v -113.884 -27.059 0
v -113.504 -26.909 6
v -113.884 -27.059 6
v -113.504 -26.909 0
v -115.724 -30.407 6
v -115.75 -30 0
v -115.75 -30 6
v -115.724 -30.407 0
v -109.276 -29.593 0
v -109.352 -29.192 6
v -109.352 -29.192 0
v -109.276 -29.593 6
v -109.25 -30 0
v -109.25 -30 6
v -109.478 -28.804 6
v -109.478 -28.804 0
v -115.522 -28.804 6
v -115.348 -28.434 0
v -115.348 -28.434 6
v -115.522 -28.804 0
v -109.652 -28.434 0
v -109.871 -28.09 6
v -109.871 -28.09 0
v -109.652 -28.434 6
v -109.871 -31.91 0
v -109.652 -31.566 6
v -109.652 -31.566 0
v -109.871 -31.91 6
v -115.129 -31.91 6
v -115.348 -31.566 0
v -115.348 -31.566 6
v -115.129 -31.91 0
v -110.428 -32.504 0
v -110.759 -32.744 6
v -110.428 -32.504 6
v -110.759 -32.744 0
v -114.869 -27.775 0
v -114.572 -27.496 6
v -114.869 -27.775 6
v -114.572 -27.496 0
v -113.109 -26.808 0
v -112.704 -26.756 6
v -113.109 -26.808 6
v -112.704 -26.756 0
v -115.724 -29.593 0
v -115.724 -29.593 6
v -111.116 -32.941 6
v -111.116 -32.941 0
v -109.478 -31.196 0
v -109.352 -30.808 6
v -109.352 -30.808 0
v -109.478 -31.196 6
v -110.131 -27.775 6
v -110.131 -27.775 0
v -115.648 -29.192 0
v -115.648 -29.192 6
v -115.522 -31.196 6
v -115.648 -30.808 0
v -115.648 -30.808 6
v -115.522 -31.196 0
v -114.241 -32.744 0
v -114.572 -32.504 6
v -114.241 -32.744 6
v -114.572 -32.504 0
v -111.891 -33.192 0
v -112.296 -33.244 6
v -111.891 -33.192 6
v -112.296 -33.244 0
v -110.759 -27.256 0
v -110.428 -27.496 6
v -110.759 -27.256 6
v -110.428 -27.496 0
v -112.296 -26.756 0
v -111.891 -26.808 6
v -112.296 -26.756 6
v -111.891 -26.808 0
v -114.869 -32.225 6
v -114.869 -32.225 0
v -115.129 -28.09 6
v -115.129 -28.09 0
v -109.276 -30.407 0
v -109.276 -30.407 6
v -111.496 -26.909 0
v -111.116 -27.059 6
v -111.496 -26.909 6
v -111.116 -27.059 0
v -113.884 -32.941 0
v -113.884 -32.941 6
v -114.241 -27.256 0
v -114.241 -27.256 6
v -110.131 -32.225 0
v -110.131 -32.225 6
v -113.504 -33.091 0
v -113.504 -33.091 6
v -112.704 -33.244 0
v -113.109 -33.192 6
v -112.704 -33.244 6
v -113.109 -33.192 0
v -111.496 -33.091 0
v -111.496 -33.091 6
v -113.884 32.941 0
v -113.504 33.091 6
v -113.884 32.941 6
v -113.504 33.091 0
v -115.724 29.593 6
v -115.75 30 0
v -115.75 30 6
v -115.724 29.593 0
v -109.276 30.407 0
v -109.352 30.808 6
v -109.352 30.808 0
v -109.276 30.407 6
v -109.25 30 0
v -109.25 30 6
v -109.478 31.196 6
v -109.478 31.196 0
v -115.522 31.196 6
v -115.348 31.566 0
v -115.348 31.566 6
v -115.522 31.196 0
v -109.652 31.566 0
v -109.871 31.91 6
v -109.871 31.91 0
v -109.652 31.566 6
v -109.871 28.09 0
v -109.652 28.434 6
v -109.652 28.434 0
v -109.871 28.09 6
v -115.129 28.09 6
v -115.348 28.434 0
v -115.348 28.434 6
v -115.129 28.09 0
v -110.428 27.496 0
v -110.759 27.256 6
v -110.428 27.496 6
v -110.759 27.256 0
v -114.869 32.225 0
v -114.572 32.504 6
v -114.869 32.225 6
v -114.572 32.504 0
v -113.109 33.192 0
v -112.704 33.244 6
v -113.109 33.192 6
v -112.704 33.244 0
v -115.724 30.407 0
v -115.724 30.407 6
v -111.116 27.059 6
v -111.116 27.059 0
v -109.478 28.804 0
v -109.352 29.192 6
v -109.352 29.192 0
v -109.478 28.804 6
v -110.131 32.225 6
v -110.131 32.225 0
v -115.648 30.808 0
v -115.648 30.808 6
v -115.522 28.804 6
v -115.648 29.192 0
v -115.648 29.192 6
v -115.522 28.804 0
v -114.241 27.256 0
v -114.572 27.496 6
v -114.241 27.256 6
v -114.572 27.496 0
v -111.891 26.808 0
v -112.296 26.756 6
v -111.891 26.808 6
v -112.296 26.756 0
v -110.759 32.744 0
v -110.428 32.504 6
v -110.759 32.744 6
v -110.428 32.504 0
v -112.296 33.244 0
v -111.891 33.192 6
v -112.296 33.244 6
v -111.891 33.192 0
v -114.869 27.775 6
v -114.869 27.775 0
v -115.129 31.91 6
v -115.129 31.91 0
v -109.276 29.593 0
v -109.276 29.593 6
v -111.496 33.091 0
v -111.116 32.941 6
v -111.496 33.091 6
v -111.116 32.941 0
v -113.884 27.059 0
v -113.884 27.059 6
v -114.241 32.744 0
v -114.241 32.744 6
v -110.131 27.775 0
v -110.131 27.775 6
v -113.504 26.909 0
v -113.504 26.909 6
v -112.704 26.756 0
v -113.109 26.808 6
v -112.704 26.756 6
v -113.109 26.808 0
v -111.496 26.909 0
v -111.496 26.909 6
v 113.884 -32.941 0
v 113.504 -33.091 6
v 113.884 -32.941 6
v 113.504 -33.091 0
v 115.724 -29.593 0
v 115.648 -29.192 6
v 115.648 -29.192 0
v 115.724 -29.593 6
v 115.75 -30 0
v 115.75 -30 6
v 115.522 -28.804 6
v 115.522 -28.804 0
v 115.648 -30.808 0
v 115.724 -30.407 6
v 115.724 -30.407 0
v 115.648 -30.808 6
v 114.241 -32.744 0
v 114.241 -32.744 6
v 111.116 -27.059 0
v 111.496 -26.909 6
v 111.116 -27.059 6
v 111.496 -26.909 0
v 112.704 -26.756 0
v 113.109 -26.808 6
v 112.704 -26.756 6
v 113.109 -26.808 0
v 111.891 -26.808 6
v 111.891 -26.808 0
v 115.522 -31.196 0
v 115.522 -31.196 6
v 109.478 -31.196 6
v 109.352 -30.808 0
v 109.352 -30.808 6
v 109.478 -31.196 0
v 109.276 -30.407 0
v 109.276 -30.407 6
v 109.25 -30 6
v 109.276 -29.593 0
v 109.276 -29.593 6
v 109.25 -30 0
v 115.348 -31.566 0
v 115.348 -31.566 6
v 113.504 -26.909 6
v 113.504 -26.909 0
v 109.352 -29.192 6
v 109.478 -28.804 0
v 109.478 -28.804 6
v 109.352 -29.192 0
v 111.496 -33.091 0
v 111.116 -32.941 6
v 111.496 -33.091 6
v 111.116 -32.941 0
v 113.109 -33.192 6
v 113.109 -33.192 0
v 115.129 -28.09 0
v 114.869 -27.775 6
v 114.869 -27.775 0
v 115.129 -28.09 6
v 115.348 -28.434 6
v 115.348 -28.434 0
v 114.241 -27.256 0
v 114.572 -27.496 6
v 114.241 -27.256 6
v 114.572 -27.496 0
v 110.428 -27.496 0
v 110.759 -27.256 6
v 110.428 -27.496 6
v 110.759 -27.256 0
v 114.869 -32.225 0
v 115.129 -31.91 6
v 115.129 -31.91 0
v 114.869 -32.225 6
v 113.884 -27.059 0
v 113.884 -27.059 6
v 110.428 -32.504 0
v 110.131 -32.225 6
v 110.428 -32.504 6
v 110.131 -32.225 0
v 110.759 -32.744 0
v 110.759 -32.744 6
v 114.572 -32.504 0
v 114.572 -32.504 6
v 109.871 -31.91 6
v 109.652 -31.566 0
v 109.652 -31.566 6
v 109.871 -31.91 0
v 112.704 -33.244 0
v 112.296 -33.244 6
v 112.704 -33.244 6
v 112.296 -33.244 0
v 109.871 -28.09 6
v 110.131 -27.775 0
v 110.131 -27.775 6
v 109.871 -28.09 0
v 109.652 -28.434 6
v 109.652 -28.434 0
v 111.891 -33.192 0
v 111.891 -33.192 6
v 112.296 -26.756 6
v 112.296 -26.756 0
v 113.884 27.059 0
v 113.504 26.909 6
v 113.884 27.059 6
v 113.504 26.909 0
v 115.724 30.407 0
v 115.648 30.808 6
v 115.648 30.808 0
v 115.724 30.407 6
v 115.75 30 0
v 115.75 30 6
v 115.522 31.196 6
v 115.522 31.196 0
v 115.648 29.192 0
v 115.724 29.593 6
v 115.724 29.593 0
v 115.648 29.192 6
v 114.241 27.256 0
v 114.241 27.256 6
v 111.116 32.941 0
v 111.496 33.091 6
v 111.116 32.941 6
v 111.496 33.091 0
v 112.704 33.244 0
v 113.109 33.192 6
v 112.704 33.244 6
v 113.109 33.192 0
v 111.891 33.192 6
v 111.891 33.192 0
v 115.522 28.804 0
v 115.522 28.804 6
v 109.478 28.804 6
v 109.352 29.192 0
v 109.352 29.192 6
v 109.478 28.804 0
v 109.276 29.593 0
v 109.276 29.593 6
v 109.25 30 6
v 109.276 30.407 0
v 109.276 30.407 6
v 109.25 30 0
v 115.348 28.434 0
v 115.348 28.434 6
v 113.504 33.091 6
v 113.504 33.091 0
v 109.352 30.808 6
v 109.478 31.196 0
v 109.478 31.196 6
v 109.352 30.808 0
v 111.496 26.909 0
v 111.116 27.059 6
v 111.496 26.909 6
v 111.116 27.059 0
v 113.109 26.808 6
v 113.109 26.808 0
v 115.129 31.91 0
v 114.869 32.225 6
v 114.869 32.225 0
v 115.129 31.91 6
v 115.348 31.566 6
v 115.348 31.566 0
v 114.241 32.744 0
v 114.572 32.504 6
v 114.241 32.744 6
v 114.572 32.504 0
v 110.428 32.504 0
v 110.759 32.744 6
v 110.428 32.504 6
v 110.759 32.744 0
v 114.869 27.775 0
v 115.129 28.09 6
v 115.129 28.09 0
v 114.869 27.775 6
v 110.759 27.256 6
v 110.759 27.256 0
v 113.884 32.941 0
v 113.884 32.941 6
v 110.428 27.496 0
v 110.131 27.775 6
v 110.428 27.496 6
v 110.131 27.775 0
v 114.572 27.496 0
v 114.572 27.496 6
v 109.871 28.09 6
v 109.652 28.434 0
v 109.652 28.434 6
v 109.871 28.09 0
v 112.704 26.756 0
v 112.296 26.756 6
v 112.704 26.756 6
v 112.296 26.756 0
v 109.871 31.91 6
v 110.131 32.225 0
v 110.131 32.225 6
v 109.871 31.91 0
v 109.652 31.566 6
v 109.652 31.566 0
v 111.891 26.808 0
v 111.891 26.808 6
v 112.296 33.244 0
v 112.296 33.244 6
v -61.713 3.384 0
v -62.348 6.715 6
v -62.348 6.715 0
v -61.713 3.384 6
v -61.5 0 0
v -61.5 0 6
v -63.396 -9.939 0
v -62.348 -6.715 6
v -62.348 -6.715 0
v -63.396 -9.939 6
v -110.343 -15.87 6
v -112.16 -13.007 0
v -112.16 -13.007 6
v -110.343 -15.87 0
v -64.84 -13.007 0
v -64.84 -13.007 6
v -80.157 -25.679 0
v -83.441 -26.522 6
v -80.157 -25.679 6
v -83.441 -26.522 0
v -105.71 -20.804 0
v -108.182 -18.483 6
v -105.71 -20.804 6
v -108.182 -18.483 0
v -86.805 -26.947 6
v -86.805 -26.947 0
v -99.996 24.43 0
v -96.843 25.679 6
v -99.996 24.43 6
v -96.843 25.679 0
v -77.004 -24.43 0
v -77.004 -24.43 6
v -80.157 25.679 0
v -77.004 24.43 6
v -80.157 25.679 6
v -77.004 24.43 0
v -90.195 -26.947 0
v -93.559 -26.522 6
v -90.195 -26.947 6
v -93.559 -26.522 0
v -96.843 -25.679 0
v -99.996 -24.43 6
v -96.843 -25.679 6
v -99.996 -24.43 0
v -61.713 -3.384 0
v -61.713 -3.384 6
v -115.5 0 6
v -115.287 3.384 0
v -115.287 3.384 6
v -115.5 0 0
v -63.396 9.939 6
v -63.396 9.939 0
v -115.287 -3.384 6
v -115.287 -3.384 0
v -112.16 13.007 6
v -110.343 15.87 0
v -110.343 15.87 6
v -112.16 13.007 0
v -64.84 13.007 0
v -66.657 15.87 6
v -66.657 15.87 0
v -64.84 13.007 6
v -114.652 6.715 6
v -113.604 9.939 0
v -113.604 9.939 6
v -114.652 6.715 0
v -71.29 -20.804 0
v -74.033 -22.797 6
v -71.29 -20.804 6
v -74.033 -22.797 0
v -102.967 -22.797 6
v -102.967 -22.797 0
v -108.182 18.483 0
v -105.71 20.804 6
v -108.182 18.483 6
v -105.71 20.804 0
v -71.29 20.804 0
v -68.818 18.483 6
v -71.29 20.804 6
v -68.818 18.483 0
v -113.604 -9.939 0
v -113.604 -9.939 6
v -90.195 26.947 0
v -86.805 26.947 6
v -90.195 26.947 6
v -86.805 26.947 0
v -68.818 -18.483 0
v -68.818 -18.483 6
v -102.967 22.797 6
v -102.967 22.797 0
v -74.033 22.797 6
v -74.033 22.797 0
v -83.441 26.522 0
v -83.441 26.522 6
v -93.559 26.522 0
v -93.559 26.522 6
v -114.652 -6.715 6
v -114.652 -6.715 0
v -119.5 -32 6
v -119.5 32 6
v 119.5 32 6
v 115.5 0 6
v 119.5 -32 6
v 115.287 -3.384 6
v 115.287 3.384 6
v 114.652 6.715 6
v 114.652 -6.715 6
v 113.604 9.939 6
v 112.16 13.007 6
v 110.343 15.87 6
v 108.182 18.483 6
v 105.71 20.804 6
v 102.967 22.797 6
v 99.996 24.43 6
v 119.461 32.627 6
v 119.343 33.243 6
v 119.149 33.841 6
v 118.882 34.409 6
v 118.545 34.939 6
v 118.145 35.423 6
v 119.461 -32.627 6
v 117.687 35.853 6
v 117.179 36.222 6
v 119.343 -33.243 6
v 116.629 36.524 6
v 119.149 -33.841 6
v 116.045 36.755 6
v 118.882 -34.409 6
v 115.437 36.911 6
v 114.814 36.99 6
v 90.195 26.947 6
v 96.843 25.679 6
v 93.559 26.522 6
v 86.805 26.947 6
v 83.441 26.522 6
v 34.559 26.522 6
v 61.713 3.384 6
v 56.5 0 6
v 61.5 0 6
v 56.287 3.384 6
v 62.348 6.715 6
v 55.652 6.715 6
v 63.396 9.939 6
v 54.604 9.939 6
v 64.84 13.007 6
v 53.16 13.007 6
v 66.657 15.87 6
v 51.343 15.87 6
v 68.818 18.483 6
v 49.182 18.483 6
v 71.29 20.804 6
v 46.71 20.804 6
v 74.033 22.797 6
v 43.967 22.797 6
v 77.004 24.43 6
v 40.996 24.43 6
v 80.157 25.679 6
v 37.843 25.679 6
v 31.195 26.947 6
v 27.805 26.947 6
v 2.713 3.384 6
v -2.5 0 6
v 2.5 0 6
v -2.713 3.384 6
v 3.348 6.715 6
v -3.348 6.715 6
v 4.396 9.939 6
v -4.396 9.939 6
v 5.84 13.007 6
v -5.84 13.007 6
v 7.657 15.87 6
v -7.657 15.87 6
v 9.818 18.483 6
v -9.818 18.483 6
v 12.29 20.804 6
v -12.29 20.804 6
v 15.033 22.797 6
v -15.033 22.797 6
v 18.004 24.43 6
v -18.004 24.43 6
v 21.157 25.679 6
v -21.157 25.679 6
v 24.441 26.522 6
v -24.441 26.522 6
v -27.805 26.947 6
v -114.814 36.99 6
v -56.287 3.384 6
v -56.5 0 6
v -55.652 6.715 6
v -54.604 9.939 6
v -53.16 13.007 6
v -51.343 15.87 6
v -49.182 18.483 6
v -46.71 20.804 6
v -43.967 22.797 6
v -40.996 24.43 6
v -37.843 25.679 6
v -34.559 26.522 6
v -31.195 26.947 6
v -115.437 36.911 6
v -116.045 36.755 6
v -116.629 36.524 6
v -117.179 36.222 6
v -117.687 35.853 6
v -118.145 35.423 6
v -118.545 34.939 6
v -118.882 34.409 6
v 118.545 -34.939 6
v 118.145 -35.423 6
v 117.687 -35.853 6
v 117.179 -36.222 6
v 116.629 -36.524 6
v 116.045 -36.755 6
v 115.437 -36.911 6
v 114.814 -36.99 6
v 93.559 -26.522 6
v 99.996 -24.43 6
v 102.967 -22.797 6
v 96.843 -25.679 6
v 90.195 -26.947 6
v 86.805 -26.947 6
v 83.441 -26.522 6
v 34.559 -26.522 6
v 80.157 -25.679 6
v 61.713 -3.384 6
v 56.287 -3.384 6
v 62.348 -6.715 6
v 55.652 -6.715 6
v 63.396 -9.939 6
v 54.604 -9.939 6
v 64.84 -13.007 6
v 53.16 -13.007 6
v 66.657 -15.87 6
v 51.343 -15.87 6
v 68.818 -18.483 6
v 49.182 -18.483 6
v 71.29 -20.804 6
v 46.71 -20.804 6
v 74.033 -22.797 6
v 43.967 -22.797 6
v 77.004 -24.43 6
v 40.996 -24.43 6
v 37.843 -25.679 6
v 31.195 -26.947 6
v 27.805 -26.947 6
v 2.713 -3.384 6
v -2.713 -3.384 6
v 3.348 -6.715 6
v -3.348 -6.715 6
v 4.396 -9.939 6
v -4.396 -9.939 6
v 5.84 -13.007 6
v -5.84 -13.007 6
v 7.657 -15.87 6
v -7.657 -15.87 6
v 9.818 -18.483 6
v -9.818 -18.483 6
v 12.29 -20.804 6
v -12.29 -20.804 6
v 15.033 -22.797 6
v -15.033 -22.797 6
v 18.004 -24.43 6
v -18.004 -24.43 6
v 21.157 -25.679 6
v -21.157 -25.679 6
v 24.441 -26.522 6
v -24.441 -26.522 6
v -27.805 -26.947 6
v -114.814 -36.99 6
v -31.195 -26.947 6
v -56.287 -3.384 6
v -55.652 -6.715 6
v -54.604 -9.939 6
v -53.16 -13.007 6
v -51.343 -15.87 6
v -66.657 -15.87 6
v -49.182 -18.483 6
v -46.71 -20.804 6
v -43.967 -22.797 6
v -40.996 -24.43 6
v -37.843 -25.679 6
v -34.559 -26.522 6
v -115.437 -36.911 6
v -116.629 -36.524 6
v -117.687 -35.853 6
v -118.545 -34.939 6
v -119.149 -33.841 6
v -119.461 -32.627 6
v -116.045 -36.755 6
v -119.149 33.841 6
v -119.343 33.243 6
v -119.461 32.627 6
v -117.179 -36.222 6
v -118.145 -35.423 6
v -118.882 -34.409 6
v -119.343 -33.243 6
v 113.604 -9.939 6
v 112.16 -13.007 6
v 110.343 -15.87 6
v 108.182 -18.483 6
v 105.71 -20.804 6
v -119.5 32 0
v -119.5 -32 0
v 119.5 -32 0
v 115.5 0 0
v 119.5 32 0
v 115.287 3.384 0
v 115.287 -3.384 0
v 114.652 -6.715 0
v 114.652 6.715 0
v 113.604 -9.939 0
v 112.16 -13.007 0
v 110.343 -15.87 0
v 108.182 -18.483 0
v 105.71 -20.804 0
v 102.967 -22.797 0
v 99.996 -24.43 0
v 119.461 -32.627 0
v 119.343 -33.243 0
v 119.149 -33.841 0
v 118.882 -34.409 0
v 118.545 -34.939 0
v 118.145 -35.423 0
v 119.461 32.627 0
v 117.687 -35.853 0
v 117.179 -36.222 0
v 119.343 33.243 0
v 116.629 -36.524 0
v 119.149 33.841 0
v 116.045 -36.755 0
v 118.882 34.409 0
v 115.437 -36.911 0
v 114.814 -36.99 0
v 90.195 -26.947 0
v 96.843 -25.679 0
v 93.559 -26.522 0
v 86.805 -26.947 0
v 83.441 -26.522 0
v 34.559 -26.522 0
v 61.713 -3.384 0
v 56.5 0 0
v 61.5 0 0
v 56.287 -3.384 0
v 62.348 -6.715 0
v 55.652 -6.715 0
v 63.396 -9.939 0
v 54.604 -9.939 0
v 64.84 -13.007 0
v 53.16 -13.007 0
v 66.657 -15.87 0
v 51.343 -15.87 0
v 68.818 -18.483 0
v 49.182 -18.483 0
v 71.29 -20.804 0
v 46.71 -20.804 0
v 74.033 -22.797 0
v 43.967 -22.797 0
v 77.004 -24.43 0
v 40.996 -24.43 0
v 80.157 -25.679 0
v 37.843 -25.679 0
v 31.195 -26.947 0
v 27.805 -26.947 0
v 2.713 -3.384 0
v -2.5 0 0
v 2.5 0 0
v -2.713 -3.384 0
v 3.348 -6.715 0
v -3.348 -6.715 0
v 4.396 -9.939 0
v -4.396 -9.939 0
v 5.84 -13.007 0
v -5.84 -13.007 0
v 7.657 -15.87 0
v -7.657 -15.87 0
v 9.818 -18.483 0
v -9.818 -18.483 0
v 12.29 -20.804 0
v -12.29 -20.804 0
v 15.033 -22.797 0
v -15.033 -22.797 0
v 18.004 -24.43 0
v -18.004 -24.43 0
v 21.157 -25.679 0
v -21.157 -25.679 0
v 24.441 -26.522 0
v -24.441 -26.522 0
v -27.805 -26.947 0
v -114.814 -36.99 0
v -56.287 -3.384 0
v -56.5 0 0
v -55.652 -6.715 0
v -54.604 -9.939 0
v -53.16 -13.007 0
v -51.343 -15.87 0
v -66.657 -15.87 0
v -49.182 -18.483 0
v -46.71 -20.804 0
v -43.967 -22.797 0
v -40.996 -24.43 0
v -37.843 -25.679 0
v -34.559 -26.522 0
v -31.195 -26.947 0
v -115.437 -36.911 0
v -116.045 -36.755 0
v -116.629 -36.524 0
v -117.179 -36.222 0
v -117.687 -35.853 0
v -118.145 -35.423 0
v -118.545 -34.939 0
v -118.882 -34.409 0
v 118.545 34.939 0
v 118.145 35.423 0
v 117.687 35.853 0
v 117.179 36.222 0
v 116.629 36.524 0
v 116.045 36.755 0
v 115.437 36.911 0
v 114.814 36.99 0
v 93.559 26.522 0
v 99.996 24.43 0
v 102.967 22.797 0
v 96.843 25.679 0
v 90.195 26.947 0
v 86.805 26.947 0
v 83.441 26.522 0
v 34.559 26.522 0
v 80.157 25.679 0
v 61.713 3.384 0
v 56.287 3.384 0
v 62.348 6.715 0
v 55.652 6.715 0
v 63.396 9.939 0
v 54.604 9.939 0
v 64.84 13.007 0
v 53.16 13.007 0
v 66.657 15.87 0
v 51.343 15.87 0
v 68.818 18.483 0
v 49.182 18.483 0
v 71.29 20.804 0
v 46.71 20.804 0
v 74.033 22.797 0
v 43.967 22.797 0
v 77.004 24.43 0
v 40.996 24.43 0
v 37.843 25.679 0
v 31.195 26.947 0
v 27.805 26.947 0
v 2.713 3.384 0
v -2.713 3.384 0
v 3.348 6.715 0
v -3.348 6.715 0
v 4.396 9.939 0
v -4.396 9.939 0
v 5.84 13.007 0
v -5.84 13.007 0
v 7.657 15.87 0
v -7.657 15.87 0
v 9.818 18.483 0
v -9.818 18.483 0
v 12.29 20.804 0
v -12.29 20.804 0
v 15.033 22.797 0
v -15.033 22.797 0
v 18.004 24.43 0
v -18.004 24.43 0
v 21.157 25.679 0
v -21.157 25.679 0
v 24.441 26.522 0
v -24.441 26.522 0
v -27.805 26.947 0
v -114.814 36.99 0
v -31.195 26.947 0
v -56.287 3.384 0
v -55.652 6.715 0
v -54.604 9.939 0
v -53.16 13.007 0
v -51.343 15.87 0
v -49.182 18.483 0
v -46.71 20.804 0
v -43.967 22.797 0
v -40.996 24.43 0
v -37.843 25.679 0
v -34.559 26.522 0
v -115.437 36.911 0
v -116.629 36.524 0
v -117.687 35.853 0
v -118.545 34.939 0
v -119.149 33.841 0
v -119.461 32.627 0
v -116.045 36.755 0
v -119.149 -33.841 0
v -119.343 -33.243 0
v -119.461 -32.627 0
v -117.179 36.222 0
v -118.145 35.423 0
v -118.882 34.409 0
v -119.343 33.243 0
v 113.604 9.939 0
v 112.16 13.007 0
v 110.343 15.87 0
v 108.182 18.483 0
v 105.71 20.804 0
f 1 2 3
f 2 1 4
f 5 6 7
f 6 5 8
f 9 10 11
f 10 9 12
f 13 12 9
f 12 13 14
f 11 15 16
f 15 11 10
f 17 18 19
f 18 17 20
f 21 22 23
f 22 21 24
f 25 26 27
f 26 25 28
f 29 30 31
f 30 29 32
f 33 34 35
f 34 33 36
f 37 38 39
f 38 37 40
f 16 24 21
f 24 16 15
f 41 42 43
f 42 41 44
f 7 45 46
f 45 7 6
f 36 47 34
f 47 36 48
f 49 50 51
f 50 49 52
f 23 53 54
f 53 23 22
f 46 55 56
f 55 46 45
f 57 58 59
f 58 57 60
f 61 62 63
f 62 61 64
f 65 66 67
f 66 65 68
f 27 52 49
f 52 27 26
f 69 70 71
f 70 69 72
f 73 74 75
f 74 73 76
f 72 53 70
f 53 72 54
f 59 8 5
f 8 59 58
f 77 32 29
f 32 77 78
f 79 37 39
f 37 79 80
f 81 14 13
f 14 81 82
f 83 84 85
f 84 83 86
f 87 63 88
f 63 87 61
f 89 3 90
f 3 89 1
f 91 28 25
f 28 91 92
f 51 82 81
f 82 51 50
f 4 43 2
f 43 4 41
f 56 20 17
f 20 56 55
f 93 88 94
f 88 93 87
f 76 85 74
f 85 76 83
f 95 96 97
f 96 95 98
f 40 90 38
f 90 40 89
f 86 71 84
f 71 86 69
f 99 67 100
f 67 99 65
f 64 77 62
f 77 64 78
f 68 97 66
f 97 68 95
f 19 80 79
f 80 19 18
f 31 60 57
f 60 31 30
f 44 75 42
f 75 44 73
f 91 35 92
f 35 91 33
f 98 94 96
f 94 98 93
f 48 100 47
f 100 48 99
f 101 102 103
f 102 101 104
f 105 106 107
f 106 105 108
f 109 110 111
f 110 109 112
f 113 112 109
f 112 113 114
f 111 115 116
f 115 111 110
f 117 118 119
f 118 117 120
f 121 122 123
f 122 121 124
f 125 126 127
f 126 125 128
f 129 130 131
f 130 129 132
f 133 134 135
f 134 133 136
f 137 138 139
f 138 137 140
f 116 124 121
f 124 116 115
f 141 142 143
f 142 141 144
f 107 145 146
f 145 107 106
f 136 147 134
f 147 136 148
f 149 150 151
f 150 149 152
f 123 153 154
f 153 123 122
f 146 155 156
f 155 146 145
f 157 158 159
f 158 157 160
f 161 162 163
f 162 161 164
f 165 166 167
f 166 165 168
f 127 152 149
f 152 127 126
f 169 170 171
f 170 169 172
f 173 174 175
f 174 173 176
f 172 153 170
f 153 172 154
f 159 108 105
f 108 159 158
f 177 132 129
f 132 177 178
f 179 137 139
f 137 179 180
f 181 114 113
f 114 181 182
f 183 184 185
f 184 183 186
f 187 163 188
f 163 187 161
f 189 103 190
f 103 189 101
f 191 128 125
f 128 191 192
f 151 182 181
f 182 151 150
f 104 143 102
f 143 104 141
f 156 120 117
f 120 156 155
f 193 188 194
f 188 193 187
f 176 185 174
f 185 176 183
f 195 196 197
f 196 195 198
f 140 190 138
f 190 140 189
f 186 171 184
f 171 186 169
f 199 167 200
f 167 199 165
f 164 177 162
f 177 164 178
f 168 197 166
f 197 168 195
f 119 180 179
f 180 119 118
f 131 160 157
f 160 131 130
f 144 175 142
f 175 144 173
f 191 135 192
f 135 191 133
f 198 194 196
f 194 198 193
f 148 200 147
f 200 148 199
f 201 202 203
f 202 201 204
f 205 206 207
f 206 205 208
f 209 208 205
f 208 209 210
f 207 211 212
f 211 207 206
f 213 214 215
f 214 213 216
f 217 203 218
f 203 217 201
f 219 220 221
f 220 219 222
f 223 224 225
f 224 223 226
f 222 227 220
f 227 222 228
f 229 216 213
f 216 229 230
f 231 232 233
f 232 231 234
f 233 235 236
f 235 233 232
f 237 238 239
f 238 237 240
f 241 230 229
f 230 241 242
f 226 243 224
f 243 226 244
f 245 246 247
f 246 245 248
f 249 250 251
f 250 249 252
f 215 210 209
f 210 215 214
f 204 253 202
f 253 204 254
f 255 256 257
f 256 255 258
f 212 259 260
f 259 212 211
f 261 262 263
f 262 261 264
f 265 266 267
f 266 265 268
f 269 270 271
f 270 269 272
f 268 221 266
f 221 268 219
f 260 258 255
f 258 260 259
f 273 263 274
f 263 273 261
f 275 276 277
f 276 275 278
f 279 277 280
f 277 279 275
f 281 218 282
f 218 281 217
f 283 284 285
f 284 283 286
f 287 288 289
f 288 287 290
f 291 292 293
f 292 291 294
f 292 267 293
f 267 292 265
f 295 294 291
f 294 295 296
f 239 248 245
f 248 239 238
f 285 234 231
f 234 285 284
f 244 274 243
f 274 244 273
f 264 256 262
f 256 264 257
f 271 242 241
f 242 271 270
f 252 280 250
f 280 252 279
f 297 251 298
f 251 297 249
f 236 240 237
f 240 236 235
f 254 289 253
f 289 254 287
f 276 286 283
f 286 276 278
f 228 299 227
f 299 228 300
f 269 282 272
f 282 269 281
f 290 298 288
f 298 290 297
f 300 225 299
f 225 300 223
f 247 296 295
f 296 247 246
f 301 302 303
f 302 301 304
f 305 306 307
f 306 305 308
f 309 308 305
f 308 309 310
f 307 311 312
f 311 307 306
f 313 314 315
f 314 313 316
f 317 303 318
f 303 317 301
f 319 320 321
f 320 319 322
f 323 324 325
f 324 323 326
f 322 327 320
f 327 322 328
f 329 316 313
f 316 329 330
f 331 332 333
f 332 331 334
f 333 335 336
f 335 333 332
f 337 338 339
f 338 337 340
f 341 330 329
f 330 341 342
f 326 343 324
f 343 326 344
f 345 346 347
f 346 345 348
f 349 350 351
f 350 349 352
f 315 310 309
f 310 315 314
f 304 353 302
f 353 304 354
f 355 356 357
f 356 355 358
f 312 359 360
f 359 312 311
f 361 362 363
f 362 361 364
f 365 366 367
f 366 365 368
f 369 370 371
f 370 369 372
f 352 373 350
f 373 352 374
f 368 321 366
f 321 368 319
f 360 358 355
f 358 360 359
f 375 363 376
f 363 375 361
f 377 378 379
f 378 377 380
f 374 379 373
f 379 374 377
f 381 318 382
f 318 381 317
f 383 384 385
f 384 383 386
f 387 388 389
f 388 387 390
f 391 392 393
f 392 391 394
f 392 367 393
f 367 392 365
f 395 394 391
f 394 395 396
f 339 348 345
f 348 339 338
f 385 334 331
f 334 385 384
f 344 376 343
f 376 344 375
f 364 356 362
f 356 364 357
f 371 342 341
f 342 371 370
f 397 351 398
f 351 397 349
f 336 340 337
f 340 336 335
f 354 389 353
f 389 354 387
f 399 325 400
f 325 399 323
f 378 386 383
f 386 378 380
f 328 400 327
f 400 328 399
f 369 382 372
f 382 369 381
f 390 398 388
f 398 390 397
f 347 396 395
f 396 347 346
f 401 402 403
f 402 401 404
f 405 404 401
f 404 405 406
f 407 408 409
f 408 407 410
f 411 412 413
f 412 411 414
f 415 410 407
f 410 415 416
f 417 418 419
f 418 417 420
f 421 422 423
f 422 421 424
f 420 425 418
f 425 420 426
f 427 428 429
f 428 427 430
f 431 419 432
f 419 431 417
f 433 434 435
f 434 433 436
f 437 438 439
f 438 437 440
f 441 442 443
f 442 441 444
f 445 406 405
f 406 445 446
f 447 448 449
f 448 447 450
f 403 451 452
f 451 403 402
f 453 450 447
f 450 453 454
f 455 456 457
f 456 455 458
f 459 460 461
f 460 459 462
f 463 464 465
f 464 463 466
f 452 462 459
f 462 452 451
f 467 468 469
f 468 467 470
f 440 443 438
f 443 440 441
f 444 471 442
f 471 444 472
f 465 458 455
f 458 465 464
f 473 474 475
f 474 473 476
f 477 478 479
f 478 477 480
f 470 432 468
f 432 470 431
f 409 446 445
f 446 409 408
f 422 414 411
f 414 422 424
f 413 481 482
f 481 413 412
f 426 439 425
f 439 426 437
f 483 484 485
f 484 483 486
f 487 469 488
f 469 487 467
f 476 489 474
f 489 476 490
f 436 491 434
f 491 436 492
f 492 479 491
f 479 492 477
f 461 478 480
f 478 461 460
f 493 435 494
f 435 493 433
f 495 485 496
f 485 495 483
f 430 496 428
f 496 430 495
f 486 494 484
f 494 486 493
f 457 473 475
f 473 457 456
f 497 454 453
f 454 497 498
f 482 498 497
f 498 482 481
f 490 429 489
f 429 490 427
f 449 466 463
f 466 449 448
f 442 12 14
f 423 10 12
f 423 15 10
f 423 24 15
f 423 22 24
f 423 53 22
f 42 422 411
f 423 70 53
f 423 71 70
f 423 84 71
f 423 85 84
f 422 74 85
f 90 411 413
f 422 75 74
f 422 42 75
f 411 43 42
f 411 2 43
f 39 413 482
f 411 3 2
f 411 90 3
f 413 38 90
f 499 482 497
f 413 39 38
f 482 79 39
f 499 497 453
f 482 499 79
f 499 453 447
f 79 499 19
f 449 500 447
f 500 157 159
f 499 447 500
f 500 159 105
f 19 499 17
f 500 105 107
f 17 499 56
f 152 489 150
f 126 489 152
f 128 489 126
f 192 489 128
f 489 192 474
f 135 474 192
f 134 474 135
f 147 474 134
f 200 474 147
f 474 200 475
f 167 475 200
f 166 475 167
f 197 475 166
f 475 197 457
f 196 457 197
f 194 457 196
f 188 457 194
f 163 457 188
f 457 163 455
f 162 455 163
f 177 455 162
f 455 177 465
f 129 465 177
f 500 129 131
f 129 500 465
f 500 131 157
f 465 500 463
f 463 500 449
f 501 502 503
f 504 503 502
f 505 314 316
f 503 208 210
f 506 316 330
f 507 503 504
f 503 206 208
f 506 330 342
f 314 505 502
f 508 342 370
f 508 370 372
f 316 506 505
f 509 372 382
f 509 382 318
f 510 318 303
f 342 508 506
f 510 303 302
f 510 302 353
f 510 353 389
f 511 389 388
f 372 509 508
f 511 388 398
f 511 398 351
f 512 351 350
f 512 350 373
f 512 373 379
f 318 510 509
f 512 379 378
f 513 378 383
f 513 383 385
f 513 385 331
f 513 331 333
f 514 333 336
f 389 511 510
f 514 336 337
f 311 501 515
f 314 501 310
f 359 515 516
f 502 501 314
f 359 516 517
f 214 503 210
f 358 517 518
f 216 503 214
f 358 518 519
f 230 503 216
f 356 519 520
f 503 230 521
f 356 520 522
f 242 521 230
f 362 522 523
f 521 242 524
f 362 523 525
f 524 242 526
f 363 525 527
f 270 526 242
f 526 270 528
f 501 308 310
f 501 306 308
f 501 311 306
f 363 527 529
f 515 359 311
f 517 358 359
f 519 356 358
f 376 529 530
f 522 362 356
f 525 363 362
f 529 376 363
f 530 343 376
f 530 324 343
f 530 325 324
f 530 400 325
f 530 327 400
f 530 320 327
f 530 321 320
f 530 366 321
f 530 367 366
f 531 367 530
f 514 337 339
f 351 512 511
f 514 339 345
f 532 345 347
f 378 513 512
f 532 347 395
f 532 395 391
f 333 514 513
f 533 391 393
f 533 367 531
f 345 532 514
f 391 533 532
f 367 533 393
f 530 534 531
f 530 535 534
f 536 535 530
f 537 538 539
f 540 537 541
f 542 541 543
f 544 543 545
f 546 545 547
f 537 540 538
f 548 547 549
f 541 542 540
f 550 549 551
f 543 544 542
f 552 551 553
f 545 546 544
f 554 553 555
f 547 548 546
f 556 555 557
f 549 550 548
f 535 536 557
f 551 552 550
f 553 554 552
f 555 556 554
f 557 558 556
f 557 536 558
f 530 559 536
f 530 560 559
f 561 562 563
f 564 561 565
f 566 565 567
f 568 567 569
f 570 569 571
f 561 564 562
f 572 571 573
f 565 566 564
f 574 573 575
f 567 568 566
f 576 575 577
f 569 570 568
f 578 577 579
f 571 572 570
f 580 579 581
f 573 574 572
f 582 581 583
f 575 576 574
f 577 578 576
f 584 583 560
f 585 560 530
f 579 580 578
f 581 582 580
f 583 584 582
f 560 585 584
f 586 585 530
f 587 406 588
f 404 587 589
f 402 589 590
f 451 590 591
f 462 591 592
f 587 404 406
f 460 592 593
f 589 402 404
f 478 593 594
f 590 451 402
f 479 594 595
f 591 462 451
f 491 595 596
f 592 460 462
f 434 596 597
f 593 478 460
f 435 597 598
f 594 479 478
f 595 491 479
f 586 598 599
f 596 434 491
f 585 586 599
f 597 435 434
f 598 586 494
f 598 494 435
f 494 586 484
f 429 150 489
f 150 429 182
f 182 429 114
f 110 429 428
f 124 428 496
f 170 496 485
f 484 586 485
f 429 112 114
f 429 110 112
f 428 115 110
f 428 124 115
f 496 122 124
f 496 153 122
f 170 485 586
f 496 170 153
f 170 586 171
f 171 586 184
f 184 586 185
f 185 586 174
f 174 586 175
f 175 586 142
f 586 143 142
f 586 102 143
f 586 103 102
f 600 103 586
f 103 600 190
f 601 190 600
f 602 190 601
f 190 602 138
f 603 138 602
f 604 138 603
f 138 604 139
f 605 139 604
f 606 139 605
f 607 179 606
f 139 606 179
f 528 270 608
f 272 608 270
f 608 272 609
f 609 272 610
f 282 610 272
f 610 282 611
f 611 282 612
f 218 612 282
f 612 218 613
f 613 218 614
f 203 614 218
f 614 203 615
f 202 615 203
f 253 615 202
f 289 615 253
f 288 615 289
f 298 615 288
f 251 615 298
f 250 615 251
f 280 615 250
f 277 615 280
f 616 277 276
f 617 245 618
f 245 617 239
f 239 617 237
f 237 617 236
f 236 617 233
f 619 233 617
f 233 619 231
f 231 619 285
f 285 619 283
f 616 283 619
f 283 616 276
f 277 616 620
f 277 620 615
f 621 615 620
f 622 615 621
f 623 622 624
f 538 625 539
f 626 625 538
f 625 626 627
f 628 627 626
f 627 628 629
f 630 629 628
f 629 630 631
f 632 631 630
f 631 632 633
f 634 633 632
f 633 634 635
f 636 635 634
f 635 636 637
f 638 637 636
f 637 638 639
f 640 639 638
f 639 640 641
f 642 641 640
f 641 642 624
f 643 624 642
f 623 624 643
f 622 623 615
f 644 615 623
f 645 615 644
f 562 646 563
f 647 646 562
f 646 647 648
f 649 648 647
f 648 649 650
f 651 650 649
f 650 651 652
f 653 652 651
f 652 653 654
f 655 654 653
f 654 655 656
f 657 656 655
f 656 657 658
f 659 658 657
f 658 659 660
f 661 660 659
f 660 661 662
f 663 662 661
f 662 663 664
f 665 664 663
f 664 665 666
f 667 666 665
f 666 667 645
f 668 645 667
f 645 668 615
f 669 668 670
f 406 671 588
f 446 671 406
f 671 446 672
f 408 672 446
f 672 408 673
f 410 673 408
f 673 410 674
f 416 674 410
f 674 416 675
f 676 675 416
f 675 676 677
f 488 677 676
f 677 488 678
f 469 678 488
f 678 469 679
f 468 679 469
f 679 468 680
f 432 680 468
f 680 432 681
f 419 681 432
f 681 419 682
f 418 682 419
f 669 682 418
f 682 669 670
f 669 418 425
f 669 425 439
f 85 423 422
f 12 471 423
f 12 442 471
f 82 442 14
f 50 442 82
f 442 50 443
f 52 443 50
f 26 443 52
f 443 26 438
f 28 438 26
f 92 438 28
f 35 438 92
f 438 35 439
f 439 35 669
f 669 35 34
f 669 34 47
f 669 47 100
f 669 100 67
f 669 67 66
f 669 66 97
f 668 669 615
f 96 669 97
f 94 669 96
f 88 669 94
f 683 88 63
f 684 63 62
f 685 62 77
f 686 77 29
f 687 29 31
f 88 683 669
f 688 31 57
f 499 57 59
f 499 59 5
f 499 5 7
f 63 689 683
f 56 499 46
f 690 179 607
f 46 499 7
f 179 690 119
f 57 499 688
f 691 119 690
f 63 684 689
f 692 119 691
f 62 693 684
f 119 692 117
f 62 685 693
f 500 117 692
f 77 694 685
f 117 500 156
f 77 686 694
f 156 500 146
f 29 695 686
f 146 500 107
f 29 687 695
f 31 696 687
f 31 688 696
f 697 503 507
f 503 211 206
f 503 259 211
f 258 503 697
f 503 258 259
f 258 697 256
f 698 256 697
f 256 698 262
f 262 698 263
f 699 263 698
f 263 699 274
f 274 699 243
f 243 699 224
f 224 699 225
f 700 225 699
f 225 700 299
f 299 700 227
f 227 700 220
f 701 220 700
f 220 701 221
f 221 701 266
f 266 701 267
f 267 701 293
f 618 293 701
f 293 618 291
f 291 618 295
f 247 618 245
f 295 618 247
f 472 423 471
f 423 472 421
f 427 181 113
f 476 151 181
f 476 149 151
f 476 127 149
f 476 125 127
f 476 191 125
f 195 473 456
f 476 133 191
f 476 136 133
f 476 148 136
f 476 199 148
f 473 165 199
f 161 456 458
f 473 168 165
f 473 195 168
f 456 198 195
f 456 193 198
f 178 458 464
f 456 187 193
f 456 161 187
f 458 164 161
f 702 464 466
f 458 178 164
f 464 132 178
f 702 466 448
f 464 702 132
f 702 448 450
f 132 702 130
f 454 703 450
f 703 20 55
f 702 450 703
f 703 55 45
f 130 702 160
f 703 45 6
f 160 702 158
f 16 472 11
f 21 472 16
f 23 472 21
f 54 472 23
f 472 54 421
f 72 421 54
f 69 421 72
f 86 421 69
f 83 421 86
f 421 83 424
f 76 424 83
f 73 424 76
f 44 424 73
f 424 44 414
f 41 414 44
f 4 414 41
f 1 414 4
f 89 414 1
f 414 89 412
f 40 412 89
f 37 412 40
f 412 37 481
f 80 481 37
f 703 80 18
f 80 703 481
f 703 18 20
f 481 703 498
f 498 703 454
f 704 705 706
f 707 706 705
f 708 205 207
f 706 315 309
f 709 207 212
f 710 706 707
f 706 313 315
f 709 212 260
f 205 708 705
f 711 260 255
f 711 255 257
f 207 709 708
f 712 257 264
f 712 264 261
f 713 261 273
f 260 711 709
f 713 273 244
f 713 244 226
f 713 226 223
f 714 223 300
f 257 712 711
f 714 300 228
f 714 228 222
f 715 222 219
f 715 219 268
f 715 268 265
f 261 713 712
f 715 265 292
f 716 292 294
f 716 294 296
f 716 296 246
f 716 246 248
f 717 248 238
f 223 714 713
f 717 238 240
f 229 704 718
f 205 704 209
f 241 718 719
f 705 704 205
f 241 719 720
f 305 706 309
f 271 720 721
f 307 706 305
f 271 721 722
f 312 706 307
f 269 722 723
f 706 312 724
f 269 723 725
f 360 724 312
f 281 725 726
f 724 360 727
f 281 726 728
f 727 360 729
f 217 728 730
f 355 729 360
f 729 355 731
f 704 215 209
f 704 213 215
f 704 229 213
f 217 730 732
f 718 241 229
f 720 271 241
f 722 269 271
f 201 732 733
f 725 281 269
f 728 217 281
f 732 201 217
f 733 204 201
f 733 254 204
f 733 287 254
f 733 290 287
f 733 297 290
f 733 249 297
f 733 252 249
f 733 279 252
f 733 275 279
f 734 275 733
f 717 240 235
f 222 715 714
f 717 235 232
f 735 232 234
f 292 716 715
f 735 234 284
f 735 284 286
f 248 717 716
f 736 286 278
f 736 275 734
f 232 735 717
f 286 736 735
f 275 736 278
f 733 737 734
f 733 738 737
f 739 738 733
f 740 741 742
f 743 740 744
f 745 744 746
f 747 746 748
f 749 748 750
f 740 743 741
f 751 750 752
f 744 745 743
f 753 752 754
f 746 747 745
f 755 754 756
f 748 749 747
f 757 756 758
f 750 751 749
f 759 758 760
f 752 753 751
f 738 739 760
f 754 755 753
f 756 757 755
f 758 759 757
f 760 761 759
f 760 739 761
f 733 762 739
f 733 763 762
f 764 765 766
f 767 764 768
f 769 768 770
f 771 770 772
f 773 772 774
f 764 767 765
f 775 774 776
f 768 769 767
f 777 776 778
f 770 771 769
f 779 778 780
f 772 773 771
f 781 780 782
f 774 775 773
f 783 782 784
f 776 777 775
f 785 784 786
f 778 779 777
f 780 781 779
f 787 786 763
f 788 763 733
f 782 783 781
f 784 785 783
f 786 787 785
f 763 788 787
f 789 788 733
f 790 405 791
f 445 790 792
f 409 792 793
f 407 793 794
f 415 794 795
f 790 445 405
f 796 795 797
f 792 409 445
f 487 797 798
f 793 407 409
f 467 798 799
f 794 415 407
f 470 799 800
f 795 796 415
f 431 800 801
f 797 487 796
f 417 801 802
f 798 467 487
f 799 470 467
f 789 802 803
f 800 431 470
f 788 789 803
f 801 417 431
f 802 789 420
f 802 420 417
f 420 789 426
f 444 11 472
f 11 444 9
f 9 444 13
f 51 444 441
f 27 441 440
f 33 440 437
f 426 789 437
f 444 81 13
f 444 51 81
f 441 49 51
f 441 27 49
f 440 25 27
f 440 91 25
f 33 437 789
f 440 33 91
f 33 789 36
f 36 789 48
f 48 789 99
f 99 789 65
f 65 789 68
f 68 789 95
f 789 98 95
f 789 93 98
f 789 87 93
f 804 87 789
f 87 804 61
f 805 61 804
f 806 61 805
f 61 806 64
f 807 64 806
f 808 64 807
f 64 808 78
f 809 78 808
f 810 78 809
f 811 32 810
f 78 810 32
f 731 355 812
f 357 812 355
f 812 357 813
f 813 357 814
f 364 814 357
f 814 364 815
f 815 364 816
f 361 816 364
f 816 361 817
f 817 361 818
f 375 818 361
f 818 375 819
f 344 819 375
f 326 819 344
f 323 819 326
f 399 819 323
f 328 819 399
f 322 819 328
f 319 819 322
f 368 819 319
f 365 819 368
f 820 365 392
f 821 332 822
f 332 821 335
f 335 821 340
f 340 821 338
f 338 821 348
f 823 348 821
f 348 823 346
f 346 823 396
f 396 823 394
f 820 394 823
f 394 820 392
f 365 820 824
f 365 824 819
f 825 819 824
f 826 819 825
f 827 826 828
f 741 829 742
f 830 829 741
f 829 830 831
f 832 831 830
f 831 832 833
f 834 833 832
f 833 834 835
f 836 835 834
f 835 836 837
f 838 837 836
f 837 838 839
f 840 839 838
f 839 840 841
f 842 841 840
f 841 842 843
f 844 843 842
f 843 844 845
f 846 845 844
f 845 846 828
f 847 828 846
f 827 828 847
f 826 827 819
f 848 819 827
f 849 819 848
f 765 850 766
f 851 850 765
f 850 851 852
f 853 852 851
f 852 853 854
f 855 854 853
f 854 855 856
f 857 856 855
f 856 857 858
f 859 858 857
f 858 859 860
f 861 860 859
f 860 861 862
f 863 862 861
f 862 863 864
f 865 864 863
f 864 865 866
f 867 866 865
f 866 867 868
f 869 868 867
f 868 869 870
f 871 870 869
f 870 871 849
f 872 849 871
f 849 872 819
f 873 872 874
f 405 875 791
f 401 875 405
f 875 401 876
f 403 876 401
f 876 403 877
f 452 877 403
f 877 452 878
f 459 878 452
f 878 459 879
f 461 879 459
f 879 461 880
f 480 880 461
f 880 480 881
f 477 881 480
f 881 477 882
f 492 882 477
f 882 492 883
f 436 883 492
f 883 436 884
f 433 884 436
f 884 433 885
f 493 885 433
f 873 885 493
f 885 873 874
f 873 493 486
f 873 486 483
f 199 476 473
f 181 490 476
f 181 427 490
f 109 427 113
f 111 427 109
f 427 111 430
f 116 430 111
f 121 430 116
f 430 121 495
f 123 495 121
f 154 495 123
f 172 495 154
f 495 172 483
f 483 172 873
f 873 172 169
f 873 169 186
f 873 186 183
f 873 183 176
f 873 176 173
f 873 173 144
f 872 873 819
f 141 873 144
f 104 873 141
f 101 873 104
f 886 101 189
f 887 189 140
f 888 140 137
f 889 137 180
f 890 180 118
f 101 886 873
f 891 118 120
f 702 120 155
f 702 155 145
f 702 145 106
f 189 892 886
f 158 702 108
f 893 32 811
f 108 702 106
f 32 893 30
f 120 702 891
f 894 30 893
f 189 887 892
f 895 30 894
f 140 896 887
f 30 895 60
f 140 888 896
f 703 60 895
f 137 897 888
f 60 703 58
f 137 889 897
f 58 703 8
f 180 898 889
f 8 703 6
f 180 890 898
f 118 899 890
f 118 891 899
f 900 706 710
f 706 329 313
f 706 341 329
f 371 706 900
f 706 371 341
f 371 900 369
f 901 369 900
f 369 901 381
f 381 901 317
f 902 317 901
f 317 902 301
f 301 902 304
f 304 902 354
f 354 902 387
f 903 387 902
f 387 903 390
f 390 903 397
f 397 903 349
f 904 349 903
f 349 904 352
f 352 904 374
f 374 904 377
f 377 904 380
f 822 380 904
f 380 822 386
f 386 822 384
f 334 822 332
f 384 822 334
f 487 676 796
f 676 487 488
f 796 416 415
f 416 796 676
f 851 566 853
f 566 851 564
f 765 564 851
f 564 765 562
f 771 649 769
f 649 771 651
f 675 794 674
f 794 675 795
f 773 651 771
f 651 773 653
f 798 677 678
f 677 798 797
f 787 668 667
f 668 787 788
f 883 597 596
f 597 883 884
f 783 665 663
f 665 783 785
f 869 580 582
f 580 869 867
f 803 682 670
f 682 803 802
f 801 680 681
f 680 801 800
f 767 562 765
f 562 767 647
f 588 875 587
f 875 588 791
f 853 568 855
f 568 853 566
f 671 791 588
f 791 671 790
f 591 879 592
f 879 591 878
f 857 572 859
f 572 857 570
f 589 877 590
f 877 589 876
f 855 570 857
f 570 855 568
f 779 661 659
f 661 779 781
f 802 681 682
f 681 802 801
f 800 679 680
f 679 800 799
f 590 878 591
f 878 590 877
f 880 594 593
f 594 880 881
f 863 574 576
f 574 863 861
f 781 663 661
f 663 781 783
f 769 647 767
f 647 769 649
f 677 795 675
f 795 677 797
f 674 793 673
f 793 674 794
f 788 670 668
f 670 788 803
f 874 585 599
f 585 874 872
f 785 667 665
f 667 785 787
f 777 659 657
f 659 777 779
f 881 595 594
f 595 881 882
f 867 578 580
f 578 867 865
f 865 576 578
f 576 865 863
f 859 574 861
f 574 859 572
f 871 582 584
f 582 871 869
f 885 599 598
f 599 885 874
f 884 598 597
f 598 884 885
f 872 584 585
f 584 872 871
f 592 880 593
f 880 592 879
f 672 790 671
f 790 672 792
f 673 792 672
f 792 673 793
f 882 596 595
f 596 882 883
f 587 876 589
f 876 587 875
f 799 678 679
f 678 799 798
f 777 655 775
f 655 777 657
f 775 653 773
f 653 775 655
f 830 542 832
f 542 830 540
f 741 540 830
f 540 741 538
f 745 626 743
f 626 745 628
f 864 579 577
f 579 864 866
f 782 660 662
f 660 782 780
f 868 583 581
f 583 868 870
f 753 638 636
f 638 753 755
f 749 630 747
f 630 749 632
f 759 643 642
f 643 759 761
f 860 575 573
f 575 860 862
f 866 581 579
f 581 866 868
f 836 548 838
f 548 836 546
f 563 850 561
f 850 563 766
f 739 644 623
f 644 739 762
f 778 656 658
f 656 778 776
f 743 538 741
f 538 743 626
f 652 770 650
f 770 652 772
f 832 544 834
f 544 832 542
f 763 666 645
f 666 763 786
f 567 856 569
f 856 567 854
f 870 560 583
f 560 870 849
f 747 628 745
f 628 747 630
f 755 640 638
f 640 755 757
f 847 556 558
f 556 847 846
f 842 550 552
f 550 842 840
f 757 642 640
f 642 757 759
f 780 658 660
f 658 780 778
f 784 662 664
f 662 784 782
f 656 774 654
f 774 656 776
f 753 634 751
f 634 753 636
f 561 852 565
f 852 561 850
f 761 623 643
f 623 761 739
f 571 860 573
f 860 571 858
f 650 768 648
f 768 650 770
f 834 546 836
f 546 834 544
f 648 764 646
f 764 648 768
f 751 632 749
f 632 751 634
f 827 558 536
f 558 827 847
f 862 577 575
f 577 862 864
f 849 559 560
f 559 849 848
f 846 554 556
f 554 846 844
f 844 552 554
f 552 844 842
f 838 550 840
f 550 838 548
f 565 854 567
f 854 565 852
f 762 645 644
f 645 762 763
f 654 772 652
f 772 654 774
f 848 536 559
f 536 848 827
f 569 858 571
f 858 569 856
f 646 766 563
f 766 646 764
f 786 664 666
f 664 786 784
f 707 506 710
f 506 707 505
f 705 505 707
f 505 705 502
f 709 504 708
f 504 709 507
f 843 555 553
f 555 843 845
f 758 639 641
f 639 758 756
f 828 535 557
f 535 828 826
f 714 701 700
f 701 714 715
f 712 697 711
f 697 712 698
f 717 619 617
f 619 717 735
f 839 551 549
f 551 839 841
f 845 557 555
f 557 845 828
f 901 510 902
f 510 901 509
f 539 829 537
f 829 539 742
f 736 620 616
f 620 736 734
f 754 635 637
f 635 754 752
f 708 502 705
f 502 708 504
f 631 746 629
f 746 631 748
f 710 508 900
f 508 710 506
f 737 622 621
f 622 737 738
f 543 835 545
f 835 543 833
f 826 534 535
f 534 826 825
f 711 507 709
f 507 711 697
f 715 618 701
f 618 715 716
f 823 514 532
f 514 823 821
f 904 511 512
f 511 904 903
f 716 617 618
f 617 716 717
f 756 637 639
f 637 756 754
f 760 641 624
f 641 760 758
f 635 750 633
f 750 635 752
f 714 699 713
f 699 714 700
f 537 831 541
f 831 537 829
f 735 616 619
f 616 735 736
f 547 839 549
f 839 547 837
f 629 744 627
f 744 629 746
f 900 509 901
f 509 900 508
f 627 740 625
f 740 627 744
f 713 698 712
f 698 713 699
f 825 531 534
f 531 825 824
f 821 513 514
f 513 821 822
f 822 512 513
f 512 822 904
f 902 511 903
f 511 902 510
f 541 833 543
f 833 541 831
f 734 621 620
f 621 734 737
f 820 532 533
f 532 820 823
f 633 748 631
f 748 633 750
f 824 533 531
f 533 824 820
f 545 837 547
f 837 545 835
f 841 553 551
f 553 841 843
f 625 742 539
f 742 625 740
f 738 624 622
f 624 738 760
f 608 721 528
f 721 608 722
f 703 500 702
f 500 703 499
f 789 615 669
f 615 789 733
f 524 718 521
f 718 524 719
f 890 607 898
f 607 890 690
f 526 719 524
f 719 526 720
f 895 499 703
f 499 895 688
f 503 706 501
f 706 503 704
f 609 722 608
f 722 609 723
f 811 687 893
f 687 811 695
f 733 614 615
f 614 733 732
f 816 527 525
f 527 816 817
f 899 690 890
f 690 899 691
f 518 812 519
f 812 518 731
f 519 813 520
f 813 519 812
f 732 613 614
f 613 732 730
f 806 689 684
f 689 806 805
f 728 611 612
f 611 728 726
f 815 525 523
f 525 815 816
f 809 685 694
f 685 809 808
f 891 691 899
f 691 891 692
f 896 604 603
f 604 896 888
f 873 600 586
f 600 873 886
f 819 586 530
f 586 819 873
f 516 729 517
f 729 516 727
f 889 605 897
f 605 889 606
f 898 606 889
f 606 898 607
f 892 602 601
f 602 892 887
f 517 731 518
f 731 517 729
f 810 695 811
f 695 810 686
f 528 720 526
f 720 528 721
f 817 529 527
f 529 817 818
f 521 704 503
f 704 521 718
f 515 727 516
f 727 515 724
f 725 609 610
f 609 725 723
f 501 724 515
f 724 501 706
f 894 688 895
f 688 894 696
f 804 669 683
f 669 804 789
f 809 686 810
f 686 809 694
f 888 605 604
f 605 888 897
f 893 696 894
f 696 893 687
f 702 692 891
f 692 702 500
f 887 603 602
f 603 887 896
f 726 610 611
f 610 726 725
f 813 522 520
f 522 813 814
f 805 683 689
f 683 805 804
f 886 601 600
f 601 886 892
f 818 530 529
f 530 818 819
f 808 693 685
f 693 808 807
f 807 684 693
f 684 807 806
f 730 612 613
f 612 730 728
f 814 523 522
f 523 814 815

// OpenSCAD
$fn = 50;

difference() {
	union() {
		hull() {
			translate(v = [-114.5, 32.0, 0]) {
				cylinder(h = 6, r = 5);
			}
			translate(v = [114.5, 32.0, 0]) {
				cylinder(h = 6, r = 5);
			}
			translate(v = [-114.5, -32.0, 0]) {
				cylinder(h = 6, r = 5);
			}
			translate(v = [114.5, -32.0, 0]) {
				cylinder(h = 6, r = 5);
			}
		}
	}
	union() {
		translate(v = [-112.5, -30.0, -100.0]) {
			cylinder(h = 200, r = 3.25);
		}
		translate(v = [-112.5, 30.0, -100.0]) {
			cylinder(h = 200, r = 3.25);
		}
		translate(v = [112.5, -30.0, -100.0]) {
			cylinder(h = 200, r = 3.25);
		}
		translate(v = [112.5, 30.0, -100.0]) {
			cylinder(h = 200, r = 3.25);
		}
		translate(v = [-112.5, -30.0, -100.0]) {
			cylinder(h = 200, r = 1.8);
		}
		translate(v = [-112.5, 30.0, -100.0]) {
			cylinder(h = 200, r = 1.8);
		}
		translate(v = [112.5, -30.0, -100.0]) {
			cylinder(h = 200, r = 1.8);
		}
		translate(v = [112.5, 30.0, -100.0]) {
			cylinder(h = 200, r = 1.8);
		}
		translate(v = [-88.5, 0, 0.0]) {
			cylinder(h = 6, r = 27.0);
		}
		translate(v = [-29.5, 0, 0.0]) {
			cylinder(h = 6, r = 27.0);
		}
		translate(v = [29.5, 0, 0.0]) {
			cylinder(h = 6, r = 27.0);
		}
		translate(v = [88.5, 0, 0.0]) {
			cylinder(h = 6, r = 27.0);
		}
	}
}
